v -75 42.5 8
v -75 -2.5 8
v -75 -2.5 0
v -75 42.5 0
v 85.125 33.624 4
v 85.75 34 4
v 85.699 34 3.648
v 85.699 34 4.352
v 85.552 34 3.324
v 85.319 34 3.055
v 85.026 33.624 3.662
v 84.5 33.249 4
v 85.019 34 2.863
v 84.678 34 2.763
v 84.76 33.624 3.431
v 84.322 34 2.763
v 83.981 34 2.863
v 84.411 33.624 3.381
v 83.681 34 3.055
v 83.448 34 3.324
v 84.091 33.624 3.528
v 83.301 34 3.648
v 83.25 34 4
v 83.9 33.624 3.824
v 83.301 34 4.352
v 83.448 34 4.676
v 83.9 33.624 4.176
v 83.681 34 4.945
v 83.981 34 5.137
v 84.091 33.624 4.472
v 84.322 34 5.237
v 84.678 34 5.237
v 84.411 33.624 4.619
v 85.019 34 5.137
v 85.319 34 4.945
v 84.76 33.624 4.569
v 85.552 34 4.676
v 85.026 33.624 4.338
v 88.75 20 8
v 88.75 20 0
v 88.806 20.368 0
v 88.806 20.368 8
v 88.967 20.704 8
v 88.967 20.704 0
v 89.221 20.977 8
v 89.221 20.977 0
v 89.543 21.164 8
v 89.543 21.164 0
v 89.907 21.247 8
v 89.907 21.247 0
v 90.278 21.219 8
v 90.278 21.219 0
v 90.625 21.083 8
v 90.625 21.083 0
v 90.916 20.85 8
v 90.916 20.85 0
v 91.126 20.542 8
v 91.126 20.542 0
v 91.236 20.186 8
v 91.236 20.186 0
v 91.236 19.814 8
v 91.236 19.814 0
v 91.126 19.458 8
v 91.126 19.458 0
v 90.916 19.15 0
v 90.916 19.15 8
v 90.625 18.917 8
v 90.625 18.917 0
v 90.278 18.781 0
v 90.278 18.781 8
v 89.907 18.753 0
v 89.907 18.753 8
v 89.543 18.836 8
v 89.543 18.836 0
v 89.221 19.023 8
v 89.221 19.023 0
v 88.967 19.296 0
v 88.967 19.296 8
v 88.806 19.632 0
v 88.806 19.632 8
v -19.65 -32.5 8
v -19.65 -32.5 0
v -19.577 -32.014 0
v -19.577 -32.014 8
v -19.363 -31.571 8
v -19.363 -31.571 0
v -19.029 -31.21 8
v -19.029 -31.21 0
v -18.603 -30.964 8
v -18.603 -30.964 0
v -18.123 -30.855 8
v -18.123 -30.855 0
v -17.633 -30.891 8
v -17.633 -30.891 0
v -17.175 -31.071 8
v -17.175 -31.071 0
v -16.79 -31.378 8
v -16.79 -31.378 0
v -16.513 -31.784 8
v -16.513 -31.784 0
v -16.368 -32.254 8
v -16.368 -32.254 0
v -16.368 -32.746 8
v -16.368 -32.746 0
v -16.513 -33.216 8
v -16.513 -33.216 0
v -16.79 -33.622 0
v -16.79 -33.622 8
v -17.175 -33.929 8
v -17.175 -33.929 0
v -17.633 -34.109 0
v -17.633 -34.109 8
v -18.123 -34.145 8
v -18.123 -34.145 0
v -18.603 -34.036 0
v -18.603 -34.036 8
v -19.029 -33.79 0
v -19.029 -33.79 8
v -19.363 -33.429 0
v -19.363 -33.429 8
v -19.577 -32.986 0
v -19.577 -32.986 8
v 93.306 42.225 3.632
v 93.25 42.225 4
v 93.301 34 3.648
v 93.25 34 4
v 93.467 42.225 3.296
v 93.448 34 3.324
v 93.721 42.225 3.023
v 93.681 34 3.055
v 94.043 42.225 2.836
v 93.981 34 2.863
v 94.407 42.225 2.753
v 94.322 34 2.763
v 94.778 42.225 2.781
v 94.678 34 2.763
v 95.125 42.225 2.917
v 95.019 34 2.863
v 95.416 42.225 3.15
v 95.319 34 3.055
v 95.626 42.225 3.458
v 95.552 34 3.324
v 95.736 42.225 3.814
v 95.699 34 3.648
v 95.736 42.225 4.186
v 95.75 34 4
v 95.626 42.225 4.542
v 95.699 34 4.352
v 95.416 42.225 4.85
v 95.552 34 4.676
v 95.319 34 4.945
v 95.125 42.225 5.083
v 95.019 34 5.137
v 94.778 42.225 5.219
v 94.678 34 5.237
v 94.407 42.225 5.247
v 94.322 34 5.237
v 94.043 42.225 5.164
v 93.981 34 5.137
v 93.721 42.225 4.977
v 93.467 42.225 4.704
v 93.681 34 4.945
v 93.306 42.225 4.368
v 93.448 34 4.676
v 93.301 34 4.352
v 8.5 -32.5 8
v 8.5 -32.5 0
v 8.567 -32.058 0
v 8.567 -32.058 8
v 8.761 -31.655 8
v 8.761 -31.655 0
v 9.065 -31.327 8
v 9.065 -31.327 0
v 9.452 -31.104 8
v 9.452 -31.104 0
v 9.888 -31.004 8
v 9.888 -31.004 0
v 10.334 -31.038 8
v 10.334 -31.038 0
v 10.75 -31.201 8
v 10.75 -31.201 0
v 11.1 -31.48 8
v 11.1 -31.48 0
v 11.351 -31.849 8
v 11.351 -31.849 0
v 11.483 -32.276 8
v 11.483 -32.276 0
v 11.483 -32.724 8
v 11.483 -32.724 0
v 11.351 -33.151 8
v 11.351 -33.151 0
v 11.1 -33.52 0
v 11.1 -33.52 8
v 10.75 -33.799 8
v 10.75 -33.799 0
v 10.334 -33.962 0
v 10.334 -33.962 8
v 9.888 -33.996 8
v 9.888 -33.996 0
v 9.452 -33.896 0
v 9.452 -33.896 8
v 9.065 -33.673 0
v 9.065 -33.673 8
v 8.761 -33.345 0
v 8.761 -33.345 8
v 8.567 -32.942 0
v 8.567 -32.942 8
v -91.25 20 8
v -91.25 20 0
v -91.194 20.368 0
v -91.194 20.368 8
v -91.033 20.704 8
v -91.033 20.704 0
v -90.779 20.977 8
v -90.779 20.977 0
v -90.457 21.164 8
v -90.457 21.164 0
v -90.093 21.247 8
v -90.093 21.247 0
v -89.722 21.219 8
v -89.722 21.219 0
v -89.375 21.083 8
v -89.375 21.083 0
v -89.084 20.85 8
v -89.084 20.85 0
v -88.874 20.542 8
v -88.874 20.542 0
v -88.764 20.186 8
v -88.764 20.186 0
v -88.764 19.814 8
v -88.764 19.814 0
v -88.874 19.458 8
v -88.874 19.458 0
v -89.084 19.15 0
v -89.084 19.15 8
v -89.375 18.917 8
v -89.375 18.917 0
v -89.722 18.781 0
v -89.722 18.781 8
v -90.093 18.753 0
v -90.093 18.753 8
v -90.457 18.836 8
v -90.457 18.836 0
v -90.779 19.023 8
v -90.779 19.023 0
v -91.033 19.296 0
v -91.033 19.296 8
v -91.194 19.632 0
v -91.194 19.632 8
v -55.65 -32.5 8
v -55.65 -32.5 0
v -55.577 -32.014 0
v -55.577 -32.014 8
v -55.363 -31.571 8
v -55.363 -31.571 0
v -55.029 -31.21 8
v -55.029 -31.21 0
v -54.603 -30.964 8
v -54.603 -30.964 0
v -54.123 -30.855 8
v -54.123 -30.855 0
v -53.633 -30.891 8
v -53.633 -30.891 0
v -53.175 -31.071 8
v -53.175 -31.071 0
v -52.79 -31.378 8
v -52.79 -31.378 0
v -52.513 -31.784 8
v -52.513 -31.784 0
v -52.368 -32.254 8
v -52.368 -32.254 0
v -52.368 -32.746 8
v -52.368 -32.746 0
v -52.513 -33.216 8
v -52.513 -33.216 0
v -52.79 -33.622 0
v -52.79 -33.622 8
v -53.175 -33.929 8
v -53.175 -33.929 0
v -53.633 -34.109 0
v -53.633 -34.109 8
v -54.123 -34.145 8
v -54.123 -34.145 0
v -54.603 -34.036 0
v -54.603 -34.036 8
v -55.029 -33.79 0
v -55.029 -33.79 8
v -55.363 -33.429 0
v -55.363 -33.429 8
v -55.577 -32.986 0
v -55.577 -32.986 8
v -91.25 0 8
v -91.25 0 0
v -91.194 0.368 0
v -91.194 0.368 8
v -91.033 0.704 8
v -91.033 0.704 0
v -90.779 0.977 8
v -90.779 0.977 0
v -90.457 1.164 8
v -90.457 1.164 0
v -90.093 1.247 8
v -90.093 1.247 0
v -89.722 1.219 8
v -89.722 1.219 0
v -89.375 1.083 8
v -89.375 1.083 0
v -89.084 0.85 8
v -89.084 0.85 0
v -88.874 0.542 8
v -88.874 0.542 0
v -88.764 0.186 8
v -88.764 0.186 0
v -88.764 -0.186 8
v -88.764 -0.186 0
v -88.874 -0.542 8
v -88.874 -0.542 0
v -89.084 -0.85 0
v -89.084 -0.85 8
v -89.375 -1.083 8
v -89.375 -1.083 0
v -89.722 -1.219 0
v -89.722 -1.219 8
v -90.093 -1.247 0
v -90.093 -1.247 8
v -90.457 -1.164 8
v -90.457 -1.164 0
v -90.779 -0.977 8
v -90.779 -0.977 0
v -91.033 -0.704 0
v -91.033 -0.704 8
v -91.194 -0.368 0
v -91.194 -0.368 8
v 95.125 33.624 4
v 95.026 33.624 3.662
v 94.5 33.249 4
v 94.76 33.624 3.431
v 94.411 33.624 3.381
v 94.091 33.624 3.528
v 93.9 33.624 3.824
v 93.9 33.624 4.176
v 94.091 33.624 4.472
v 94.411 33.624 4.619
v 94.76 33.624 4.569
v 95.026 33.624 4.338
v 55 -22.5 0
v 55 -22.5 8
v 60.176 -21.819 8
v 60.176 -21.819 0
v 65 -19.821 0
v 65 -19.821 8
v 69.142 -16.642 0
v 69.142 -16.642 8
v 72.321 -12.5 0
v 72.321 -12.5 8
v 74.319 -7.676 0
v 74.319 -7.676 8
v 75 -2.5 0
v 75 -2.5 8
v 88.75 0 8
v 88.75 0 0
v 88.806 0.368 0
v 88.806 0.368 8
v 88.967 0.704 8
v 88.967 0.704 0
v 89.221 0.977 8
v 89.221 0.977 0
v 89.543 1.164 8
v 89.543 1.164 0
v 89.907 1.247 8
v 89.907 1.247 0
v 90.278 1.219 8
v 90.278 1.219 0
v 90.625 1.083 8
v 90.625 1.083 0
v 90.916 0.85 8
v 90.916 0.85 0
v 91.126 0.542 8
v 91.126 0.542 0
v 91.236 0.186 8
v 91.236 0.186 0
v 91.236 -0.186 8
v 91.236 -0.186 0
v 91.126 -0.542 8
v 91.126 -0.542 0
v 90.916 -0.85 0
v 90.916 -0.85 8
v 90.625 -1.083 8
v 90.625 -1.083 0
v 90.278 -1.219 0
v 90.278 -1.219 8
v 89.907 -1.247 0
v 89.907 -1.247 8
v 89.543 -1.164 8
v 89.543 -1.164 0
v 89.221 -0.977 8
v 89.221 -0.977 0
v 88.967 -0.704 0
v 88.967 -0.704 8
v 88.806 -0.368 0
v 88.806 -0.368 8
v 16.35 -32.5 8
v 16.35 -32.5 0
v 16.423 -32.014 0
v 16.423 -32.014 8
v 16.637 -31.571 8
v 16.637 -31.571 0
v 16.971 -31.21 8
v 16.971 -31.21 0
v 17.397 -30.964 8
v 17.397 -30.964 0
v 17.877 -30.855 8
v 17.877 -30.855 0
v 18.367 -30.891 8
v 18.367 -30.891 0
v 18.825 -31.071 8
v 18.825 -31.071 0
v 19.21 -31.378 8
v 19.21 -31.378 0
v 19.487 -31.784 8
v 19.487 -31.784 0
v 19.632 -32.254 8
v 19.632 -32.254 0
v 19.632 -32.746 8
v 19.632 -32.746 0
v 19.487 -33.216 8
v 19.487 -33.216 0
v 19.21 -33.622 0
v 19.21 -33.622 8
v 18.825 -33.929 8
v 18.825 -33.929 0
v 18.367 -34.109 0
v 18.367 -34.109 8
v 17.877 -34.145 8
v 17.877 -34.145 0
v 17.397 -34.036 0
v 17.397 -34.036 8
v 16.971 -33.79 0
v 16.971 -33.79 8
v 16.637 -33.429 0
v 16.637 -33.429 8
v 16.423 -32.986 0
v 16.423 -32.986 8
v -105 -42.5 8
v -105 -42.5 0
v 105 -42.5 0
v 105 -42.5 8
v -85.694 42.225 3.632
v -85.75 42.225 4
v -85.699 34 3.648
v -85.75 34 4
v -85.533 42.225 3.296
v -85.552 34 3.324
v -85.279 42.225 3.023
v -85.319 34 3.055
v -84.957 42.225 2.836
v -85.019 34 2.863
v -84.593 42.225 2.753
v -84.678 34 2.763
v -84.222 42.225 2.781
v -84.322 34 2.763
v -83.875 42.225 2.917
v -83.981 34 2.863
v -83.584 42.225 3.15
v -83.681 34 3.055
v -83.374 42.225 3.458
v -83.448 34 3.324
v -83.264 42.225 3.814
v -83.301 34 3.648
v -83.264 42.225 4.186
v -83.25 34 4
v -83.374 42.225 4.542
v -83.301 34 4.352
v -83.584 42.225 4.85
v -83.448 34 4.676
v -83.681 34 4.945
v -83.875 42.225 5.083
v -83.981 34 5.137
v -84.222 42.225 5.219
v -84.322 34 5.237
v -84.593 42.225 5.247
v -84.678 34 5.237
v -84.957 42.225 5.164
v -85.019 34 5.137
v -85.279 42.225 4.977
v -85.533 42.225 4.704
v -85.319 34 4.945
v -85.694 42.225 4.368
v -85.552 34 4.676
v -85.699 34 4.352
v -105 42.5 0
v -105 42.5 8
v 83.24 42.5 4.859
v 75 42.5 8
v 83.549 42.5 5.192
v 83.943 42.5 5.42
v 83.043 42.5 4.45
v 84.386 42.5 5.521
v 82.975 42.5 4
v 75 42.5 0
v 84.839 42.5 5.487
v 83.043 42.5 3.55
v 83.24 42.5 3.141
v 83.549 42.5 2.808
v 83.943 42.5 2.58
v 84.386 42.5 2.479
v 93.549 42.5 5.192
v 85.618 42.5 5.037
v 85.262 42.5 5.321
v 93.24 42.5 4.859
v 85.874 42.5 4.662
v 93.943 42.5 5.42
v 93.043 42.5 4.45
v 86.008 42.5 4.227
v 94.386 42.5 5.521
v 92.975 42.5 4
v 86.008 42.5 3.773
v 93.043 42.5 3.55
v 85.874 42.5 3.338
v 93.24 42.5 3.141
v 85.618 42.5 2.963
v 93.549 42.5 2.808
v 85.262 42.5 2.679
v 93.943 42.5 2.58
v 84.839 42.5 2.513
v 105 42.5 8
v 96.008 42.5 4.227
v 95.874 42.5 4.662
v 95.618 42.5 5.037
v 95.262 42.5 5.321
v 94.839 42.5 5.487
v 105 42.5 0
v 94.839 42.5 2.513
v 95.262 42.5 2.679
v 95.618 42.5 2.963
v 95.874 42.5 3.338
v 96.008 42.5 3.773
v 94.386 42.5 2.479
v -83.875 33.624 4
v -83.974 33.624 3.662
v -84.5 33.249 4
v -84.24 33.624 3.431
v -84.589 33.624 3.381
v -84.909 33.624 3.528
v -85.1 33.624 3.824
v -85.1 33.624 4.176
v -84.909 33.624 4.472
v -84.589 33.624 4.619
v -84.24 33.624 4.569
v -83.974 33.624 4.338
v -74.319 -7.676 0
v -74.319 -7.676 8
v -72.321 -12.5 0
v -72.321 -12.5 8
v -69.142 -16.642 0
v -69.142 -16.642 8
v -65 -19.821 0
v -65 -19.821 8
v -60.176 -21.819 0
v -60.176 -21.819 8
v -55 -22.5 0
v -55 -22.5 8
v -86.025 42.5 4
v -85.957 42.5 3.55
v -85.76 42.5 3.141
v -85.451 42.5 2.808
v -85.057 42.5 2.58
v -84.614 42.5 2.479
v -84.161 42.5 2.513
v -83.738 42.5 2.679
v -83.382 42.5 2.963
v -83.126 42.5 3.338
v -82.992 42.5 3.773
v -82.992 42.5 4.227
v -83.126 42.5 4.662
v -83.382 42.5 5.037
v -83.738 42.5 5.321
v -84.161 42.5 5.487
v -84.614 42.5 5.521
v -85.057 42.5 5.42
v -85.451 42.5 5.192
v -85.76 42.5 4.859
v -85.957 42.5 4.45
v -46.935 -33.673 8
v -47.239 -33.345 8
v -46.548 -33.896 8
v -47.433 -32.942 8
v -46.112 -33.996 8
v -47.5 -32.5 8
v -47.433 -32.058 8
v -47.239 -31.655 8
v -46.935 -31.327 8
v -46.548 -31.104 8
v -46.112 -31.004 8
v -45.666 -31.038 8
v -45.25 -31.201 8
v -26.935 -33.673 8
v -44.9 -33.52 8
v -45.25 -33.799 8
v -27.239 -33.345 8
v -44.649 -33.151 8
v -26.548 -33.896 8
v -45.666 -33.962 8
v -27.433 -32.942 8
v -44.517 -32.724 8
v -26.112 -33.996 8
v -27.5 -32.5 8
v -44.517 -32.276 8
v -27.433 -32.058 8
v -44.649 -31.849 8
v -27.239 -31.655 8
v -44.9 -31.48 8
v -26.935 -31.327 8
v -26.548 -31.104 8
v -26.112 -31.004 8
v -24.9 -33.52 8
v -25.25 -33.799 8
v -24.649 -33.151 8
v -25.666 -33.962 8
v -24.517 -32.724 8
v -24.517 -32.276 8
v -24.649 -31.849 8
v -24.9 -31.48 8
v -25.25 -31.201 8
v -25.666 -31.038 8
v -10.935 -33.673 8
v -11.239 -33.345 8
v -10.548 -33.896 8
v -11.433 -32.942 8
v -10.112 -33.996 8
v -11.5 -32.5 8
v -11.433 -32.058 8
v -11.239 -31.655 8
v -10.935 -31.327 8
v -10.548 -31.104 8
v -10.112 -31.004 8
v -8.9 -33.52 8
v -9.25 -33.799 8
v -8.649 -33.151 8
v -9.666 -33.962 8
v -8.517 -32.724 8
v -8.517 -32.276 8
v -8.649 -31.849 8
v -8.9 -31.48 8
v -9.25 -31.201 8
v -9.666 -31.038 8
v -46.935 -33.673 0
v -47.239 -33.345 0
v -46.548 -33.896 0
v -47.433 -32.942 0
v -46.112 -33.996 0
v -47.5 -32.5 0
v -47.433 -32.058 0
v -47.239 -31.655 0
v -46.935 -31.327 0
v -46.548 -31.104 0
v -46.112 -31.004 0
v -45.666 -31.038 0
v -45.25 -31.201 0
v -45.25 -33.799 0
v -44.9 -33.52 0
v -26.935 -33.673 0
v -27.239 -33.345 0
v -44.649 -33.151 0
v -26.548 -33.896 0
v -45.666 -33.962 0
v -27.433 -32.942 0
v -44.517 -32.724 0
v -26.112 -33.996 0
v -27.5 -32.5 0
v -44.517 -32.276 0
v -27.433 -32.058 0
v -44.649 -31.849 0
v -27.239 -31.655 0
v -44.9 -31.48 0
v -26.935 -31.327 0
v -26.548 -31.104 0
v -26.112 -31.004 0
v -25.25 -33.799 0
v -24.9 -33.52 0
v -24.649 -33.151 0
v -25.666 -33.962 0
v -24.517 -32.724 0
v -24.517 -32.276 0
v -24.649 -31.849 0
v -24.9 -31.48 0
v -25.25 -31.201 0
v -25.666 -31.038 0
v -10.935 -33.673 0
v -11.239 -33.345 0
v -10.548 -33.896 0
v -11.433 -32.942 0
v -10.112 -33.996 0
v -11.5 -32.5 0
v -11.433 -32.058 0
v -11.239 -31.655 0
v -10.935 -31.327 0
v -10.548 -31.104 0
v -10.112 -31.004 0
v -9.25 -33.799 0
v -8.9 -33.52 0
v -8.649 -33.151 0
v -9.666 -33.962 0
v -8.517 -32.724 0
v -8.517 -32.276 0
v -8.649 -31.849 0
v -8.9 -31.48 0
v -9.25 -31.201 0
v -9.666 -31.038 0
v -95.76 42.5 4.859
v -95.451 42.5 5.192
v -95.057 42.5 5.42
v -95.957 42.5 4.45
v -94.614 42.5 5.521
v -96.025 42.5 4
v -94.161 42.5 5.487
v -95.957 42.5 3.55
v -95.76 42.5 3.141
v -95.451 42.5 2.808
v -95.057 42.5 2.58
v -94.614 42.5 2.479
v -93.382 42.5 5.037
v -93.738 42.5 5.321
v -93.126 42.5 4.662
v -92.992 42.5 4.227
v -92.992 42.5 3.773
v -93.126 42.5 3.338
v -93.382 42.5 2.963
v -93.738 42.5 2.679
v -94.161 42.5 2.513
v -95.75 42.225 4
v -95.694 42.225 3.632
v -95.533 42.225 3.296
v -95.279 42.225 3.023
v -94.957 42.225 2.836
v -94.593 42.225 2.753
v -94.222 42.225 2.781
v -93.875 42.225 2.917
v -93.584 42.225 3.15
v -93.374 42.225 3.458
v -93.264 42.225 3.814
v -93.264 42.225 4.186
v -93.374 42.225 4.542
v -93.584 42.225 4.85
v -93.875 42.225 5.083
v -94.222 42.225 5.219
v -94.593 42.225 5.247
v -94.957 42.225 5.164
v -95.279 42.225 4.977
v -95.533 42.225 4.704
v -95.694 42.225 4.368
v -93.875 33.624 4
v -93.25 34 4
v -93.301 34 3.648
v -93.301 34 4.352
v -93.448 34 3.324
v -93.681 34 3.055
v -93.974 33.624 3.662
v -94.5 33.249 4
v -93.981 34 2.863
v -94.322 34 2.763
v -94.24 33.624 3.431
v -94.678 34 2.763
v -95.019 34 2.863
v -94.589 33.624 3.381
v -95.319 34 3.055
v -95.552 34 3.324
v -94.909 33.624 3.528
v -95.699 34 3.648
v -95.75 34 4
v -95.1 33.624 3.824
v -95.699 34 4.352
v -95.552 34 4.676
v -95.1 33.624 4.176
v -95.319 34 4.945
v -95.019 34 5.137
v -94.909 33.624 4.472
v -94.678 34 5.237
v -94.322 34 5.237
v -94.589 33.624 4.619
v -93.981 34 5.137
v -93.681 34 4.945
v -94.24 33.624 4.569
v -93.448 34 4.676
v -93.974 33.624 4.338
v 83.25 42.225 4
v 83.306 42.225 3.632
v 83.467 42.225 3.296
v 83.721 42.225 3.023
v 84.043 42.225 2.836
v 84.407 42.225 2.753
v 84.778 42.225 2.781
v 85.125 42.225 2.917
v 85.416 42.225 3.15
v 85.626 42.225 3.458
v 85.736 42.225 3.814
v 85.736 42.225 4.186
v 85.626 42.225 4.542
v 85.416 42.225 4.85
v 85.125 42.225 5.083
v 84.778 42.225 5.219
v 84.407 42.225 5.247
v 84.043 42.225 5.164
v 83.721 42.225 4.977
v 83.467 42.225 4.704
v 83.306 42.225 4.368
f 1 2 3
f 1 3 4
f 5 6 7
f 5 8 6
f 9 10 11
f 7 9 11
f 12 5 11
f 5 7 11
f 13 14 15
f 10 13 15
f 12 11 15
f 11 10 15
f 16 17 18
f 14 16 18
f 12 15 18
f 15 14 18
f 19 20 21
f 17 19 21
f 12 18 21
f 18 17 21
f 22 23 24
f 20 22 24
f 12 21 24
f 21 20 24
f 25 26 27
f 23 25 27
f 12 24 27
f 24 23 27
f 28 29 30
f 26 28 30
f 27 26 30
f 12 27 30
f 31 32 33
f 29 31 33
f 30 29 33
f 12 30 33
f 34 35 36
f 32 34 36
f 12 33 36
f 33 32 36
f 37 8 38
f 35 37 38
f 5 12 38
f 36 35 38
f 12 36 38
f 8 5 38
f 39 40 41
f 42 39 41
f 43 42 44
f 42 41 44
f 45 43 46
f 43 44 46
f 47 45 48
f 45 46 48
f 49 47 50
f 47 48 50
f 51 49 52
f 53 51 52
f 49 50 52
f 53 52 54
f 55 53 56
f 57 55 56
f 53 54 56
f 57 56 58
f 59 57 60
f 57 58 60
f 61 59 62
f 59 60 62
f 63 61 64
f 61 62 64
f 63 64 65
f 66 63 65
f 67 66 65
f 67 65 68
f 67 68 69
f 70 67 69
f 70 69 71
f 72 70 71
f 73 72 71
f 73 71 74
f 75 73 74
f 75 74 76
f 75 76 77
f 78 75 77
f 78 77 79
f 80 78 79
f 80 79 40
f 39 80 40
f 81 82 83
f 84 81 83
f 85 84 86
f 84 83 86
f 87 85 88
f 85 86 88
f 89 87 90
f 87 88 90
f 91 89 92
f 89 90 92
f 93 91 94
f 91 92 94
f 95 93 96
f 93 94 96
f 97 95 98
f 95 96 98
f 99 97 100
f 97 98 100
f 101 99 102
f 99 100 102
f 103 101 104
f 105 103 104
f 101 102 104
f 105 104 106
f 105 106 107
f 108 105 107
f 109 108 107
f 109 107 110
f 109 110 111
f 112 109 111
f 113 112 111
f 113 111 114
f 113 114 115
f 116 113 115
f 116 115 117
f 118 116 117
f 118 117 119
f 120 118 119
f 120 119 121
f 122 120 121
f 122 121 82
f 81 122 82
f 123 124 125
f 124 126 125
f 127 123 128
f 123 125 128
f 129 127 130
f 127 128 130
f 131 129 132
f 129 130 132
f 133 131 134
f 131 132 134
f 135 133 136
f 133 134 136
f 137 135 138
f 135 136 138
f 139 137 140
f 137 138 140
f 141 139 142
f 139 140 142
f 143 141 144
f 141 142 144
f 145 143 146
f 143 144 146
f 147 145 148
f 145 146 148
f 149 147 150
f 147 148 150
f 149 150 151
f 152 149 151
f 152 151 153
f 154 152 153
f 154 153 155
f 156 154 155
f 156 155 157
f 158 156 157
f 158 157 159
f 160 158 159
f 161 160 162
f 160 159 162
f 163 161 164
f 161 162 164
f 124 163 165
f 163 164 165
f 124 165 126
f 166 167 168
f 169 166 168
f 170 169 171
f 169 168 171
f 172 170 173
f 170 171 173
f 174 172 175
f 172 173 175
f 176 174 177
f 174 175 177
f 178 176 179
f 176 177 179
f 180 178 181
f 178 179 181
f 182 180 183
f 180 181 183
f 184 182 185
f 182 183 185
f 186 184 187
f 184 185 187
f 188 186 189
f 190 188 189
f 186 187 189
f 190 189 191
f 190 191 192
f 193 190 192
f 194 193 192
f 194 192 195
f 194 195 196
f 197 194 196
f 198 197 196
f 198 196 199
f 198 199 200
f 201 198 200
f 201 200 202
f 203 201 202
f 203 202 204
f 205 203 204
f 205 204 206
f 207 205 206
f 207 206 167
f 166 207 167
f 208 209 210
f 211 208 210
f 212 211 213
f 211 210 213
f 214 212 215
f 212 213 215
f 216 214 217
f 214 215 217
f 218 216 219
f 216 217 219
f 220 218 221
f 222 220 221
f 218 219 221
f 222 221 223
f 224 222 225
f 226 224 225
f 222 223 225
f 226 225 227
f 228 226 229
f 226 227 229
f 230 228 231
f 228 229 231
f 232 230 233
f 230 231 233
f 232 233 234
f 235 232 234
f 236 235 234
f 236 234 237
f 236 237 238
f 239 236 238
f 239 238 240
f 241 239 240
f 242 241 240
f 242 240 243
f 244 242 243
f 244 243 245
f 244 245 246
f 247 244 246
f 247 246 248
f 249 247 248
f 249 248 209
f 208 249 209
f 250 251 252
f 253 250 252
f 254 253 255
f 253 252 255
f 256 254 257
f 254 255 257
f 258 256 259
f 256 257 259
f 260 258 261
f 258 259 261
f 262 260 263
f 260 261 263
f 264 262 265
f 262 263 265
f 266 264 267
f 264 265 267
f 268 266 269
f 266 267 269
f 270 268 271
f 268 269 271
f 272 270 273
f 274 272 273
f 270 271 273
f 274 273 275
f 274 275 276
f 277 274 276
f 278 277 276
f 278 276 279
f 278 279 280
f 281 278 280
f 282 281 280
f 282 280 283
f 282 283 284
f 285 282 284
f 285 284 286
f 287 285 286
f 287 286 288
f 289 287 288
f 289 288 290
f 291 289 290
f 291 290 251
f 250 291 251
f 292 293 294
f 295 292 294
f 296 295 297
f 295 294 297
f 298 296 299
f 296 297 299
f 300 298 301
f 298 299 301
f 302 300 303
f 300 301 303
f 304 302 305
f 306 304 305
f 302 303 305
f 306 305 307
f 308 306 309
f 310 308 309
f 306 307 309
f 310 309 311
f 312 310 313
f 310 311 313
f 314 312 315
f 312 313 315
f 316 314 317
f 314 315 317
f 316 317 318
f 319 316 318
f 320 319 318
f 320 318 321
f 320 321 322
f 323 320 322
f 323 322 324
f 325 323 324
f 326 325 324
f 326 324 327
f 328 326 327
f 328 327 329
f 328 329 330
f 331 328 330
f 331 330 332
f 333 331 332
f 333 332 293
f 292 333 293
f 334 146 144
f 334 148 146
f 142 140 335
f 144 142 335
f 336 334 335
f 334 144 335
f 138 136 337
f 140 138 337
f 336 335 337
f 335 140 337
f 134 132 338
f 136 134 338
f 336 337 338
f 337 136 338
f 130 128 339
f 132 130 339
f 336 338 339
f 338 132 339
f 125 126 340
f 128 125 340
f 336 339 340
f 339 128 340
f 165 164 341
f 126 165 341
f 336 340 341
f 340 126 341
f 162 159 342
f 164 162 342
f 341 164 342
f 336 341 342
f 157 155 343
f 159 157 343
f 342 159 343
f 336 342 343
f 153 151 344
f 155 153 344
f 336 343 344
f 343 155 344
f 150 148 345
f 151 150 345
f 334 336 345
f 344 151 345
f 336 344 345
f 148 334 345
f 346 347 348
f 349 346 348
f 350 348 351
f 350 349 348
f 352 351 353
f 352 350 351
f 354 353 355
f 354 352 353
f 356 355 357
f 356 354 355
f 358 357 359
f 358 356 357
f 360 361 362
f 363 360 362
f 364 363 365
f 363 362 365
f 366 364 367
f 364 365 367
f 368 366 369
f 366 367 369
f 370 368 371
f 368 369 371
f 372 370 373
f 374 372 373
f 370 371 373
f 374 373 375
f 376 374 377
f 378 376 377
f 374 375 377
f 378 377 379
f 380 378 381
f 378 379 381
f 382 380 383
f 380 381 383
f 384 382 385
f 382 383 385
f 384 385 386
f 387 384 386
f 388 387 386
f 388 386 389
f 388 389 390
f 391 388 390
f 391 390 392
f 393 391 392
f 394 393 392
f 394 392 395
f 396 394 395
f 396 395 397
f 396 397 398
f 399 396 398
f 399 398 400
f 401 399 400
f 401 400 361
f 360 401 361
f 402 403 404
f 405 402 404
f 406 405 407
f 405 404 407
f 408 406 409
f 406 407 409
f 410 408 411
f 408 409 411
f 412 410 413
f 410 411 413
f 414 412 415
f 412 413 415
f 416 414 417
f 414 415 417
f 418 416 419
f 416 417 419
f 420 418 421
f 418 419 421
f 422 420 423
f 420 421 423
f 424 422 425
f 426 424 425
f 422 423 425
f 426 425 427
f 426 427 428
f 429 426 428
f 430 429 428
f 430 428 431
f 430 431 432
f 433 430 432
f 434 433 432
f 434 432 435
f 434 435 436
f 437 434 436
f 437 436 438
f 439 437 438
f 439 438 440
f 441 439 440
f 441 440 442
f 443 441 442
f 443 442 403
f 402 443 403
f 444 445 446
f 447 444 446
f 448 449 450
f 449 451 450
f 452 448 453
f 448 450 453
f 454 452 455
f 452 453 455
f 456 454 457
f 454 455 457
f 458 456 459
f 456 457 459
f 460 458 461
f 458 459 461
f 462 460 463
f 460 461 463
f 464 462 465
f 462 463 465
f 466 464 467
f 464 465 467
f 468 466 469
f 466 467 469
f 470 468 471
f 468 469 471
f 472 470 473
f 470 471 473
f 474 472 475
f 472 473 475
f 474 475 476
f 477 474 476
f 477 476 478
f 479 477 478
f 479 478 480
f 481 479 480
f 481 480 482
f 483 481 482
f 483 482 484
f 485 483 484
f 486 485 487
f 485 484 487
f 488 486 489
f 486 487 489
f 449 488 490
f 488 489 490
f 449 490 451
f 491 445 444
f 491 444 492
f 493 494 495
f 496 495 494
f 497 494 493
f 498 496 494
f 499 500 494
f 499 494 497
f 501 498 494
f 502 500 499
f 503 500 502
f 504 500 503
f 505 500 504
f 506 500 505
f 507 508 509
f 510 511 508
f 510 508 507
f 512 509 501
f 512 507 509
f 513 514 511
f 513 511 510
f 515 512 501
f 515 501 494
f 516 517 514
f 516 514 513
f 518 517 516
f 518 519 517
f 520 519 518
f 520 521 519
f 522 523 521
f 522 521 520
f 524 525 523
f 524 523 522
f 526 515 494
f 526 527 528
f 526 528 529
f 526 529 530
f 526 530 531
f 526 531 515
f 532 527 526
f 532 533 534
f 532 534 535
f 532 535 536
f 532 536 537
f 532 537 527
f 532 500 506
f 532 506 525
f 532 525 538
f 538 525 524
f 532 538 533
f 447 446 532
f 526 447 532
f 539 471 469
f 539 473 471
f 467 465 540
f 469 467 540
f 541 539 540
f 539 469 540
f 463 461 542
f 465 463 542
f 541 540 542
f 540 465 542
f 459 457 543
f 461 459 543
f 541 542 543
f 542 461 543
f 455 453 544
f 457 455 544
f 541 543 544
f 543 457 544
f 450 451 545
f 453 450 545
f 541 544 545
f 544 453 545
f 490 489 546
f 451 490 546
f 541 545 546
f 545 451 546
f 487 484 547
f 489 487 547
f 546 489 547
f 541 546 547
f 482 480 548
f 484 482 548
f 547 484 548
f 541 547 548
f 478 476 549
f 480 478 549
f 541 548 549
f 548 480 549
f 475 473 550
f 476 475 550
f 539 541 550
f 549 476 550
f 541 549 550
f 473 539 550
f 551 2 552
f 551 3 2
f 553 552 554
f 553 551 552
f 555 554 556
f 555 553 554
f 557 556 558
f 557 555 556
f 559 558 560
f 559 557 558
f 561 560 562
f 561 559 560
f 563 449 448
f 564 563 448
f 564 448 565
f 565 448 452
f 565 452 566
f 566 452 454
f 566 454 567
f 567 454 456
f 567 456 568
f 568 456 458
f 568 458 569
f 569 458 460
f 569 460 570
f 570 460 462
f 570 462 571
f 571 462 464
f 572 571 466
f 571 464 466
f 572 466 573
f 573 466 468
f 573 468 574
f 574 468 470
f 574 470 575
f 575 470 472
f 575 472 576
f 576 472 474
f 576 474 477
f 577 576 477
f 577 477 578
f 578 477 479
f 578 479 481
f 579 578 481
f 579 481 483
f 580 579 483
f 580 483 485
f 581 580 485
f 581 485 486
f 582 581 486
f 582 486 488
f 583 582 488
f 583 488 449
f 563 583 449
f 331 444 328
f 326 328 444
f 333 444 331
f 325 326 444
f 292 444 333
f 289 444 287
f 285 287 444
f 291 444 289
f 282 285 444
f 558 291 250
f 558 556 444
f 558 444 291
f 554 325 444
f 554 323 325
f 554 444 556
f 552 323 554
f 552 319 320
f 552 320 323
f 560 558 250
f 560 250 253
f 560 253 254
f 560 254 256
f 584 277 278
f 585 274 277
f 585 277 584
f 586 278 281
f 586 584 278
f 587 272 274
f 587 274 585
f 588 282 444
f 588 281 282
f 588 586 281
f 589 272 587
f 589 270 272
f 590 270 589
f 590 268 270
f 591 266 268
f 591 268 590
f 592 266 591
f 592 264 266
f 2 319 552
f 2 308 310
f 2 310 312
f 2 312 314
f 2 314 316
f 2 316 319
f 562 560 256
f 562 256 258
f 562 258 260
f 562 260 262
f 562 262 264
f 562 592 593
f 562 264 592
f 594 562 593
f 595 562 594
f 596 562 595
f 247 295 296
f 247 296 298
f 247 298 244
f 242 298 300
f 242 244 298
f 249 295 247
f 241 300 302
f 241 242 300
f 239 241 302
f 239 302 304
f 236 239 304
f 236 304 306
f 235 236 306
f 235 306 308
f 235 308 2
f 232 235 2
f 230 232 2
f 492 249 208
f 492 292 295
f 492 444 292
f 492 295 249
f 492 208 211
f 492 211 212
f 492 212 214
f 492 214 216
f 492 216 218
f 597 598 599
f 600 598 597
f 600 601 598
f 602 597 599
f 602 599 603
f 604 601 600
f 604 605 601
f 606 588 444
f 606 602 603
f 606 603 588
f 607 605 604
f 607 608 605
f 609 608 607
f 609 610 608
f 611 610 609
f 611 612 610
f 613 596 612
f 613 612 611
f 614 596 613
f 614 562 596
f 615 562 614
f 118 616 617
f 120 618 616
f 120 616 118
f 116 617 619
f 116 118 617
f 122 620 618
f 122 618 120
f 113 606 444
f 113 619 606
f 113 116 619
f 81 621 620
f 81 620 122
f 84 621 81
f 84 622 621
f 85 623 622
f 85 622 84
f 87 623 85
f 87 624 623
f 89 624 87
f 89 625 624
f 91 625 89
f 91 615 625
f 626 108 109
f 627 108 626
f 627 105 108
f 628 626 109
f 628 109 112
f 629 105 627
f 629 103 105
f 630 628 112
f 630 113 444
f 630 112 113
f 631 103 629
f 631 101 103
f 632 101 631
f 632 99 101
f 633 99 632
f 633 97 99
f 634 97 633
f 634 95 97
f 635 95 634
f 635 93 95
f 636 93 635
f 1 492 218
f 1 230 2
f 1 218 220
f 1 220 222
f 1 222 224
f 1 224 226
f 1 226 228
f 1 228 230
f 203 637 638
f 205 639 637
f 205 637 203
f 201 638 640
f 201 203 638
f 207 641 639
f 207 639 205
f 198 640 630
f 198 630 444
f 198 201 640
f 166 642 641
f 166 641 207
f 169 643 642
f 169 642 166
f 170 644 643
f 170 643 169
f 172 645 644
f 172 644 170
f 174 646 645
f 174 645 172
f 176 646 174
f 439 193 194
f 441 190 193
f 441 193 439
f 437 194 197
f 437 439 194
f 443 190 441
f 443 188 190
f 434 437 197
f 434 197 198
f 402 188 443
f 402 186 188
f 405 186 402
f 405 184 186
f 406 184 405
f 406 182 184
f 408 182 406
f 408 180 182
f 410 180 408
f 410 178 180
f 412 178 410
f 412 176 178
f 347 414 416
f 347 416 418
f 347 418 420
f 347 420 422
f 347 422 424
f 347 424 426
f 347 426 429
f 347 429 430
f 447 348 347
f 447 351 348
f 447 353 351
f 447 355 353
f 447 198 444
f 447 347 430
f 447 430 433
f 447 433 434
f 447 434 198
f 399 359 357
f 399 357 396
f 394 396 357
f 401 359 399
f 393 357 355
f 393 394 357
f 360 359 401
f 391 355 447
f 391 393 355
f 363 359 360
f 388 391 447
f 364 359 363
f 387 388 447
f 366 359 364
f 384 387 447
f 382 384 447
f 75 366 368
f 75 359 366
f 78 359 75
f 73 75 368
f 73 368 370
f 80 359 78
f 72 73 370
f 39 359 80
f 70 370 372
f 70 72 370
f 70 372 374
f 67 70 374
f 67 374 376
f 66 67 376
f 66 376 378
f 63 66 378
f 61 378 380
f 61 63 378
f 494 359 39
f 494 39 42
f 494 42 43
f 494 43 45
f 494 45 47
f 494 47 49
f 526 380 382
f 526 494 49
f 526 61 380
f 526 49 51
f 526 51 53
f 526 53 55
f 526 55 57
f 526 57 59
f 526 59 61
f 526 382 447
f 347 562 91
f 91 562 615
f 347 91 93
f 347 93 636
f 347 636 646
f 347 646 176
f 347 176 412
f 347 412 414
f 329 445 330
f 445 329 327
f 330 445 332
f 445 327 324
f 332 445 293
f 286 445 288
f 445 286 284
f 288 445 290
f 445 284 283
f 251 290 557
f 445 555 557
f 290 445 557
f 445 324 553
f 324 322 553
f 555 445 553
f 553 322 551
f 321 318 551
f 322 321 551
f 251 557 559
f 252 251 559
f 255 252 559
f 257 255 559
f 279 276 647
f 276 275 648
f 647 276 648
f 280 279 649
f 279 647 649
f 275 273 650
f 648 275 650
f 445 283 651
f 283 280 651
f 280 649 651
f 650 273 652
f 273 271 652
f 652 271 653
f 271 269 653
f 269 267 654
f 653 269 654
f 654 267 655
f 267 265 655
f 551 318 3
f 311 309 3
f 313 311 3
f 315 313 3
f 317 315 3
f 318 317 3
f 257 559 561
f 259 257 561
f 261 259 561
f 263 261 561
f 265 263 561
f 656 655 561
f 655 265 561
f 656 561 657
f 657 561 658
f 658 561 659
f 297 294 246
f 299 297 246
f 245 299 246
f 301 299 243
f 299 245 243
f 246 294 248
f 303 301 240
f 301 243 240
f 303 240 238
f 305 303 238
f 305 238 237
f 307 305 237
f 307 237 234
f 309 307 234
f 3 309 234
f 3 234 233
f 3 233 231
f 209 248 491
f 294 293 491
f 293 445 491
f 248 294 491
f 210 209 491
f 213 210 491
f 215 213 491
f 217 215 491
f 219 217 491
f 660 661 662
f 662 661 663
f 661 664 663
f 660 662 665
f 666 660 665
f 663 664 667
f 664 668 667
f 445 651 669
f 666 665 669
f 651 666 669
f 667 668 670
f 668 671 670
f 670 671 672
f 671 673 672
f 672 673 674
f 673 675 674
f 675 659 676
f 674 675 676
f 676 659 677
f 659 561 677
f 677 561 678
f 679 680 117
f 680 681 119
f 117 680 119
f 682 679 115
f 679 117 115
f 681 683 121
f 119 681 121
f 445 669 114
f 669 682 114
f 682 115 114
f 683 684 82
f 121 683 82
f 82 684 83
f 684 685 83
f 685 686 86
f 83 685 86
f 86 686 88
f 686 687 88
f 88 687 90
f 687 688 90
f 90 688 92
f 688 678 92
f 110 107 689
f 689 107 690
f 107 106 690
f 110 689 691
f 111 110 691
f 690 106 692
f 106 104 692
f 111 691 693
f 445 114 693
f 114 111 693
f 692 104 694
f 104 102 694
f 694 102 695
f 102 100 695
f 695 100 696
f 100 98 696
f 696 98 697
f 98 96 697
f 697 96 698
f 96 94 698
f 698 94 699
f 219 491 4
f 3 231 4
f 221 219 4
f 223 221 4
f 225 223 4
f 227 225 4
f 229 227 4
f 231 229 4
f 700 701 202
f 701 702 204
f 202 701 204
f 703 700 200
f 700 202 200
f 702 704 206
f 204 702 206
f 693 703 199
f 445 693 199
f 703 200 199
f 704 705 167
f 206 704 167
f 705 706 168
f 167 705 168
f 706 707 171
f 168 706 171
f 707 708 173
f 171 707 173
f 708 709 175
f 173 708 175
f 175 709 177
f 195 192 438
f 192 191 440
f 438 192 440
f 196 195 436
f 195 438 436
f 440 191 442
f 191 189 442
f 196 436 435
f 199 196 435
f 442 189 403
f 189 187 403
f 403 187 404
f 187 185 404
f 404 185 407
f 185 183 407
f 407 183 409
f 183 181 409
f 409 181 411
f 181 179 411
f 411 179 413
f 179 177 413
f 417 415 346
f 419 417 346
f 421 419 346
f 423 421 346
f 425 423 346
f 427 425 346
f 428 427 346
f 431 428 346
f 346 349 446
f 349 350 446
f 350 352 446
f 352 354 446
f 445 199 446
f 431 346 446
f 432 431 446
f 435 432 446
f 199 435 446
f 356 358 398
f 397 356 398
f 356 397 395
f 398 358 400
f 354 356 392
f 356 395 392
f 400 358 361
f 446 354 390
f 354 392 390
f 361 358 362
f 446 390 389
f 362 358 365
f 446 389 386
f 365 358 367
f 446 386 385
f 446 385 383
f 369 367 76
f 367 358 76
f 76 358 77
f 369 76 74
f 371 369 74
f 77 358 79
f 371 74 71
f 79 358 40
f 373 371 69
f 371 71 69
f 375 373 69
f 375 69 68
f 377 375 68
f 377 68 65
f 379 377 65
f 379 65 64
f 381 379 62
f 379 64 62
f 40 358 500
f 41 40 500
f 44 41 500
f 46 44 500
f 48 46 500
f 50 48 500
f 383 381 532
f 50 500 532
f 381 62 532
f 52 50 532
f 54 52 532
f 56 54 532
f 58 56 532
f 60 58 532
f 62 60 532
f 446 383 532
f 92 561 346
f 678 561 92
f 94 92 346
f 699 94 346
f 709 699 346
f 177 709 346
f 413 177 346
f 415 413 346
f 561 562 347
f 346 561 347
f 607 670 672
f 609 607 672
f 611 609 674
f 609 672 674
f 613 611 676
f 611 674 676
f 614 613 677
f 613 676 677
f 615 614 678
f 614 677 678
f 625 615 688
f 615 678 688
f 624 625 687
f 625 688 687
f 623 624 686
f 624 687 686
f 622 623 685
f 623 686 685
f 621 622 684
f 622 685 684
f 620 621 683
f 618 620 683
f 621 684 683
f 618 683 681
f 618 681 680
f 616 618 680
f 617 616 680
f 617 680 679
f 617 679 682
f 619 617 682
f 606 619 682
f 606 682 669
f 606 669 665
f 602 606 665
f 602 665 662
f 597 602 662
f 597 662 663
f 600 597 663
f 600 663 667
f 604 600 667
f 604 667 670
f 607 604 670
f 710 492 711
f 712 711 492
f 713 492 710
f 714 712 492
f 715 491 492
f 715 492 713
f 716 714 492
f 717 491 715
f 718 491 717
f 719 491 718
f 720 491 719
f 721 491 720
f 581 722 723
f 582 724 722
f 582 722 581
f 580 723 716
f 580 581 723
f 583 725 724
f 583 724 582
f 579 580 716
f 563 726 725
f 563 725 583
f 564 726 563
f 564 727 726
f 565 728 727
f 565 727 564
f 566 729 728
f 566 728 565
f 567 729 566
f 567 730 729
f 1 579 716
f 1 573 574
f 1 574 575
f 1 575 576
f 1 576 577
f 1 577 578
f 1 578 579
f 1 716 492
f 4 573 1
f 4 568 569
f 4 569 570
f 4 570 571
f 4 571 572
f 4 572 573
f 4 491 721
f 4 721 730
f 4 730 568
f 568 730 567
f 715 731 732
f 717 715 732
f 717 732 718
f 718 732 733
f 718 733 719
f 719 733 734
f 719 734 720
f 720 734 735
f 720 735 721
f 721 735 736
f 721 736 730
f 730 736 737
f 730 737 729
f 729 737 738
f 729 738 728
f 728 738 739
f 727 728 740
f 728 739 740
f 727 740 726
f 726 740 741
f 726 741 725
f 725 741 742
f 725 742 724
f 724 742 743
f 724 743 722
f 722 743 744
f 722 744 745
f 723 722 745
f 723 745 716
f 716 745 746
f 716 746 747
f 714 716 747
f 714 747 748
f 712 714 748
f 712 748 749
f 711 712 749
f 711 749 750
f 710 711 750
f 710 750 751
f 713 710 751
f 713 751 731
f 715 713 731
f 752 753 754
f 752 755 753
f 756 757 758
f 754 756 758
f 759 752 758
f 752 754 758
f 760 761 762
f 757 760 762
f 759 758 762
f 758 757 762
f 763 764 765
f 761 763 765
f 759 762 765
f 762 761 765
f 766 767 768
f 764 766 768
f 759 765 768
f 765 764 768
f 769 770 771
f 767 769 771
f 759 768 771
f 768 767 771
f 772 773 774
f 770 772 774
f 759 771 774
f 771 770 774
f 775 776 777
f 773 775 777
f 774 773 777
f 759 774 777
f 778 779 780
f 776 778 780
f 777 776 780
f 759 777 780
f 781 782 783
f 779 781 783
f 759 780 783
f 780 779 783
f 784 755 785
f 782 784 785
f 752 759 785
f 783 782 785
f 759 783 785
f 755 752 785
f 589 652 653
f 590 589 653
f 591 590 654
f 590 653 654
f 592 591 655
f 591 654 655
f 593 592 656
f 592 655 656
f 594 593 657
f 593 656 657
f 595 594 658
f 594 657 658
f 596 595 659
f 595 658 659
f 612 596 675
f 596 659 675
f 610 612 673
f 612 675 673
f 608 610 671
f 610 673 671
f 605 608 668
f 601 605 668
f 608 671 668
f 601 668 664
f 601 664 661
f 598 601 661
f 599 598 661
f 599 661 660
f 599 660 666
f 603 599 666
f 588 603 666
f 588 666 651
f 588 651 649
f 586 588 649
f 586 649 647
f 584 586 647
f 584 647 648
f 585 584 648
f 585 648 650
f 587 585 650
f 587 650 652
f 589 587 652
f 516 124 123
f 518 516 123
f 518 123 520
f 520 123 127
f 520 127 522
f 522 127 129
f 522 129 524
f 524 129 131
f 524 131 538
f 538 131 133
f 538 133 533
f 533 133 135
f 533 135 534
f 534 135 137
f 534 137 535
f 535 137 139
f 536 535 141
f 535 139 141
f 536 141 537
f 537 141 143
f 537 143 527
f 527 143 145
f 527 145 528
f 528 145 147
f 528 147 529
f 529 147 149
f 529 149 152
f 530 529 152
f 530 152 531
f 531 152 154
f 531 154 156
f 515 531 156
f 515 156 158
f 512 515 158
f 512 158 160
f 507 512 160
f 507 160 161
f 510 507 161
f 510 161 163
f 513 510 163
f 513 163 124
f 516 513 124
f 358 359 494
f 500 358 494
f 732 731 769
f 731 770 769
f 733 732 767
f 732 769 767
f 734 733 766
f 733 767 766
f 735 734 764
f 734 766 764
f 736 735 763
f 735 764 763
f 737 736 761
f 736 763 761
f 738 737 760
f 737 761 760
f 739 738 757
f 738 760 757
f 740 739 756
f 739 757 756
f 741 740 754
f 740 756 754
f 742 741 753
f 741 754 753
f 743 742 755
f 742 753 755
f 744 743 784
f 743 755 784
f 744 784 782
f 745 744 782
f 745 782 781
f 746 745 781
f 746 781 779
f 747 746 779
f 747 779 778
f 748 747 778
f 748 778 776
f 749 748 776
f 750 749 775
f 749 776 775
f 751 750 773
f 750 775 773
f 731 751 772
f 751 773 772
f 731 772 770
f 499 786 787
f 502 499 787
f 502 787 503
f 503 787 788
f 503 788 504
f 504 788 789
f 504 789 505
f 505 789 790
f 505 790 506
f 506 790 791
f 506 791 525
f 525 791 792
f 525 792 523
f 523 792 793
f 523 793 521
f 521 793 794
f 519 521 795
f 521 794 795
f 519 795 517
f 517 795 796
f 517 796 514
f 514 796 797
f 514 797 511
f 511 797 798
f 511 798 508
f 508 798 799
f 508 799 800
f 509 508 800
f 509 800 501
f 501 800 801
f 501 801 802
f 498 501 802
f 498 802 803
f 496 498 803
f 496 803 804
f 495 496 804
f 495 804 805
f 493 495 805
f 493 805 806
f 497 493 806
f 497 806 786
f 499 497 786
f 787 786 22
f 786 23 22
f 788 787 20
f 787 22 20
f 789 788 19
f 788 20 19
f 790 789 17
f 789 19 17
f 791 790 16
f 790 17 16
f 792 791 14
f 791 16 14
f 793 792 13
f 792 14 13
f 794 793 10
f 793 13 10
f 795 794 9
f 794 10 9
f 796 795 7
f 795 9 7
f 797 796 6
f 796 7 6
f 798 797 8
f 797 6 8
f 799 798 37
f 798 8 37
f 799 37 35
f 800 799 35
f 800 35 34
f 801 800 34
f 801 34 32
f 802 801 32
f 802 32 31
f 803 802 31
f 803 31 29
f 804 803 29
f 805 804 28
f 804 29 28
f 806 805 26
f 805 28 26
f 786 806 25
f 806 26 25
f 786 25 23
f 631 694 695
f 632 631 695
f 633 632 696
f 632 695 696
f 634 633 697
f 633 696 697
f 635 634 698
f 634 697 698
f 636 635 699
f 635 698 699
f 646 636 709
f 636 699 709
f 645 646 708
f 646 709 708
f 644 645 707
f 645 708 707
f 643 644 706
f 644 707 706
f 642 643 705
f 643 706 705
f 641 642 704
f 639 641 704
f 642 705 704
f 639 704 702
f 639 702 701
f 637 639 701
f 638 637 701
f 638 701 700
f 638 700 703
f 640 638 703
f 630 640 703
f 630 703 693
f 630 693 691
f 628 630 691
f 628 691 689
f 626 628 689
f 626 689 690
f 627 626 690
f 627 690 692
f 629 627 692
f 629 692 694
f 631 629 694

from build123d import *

# Parameters (mm, degrees)
SKIZZE1_W                       = 210
SKIZZE1_H                       = 85
AUFSATZ_LINEAR_AUSTRAGEN1_DEPTH = 8
M3_GEWINDEBOHRUNG1_D            = 2.5
M3_GEWINDEBOHRUNG1_DEPTH        = 8.5
M3_GEWINDEBOHRUNG1_CSINK_D      = 3.05
M3_GEWINDEBOHRUNG1_CSINK_ANGLE  = 90
M3_GEWINDEBOHRUNG1_TIP          = 0.751075774
SKIZZE4_W                       = 150
SKIZZE4_H                       = 65
SCHNITT_LINEAR_AUSTRAGEN1_DEPTH = 8
VERRUNDUNG1_R                   = 20
F_3_0_3_DURCHMESSER_BOHRUNG1_D  = 3
M4_GEWINDEBOHRUNG1_D            = 3.3
LINEARES_MUSTER1_COUNT          = 2
LINEARES_MUSTER1_PITCH          = 36
M3_GEWINDEBOHRUNG2_D            = 2.5
M3_GEWINDEBOHRUNG2_DEPTH        = 8.5
M3_GEWINDEBOHRUNG2_TIP          = 0.751075774


with BuildPart() as part:
    # Skizze1 → Aufsatz-Linear austragen1 (new body)
    with BuildSketch(Plane.XY):
        Rectangle(SKIZZE1_W, SKIZZE1_H)
    extrude(amount=AUFSATZ_LINEAR_AUSTRAGEN1_DEPTH)

    # M3 Gewindebohrung1
    with Locations(Plane(origin=(0, 42.5, 0), x_dir=(1, 0, 0), z_dir=(0, 1, 0))):
        with Locations((-94.5, -4), (-84.5, -4), (84.5, -4), (94.5, -4)):
            CounterSinkHole(M3_GEWINDEBOHRUNG1_D / 2, M3_GEWINDEBOHRUNG1_CSINK_D / 2, depth=M3_GEWINDEBOHRUNG1_DEPTH, counter_sink_angle=M3_GEWINDEBOHRUNG1_CSINK_ANGLE)
            with Locations((0, 0, -(M3_GEWINDEBOHRUNG1_DEPTH + M3_GEWINDEBOHRUNG1_TIP / 2))):  # 118° drill point
                Cone(0, M3_GEWINDEBOHRUNG1_D / 2, M3_GEWINDEBOHRUNG1_TIP, mode=Mode.SUBTRACT)

    # Skizze4 → Schnitt-Linear austragen1 (cut)
    with BuildSketch(Plane.XY.offset(8)):
        with Locations((0, 10)):
            Rectangle(SKIZZE4_W, SKIZZE4_H)
    extrude(amount=-SCHNITT_LINEAR_AUSTRAGEN1_DEPTH, mode=Mode.SUBTRACT)

    # Verrundung1
    verrundung1_edges = [part.edges().sort_by_distance(p)[0] for p in [
        (-75, -22.5, 4),
        (75, -22.5, 4),
    ]]
    fillet(verrundung1_edges, radius=VERRUNDUNG1_R)

    # Ø3.0 (3) Durchmesser Bohrung1 (through all)
    with Locations(Plane.XY.offset(8)):
        with Locations((-10, -32.5), (10, -32.5)):
            f_3_0_3_durchmesser_bohrung1 = Hole(F_3_0_3_DURCHMESSER_BOHRUNG1_D / 2)

    # M4 Gewindebohrung1 (through all)
    with Locations(Plane.XY.offset(8)):
        with Locations((-18, -32.5), (18, -32.5)):
            m4_gewindebohrung1 = Hole(M4_GEWINDEBOHRUNG1_D / 2)

    # Lineares Muster1: Ø3.0 (3) Durchmesser Bohrung1, M4 Gewindebohrung1 ×2
    with Locations(*[(-i * LINEARES_MUSTER1_PITCH, 0, 0) for i in range(1, LINEARES_MUSTER1_COUNT)]):
        add(f_3_0_3_durchmesser_bohrung1, mode=Mode.SUBTRACT)
        add(m4_gewindebohrung1, mode=Mode.SUBTRACT)

    # M3 Gewindebohrung2
    with Locations(Plane.XY.offset(8)):
        with Locations((-90, 20), (-90, 0), (90, 0), (90, 20)):
            Hole(M3_GEWINDEBOHRUNG2_D / 2, depth=M3_GEWINDEBOHRUNG2_DEPTH)
            with Locations((0, 0, -(M3_GEWINDEBOHRUNG2_DEPTH + M3_GEWINDEBOHRUNG2_TIP / 2))):  # 118° drill point
                Cone(0, M3_GEWINDEBOHRUNG2_D / 2, M3_GEWINDEBOHRUNG2_TIP, mode=Mode.SUBTRACT)


solid = part.part
